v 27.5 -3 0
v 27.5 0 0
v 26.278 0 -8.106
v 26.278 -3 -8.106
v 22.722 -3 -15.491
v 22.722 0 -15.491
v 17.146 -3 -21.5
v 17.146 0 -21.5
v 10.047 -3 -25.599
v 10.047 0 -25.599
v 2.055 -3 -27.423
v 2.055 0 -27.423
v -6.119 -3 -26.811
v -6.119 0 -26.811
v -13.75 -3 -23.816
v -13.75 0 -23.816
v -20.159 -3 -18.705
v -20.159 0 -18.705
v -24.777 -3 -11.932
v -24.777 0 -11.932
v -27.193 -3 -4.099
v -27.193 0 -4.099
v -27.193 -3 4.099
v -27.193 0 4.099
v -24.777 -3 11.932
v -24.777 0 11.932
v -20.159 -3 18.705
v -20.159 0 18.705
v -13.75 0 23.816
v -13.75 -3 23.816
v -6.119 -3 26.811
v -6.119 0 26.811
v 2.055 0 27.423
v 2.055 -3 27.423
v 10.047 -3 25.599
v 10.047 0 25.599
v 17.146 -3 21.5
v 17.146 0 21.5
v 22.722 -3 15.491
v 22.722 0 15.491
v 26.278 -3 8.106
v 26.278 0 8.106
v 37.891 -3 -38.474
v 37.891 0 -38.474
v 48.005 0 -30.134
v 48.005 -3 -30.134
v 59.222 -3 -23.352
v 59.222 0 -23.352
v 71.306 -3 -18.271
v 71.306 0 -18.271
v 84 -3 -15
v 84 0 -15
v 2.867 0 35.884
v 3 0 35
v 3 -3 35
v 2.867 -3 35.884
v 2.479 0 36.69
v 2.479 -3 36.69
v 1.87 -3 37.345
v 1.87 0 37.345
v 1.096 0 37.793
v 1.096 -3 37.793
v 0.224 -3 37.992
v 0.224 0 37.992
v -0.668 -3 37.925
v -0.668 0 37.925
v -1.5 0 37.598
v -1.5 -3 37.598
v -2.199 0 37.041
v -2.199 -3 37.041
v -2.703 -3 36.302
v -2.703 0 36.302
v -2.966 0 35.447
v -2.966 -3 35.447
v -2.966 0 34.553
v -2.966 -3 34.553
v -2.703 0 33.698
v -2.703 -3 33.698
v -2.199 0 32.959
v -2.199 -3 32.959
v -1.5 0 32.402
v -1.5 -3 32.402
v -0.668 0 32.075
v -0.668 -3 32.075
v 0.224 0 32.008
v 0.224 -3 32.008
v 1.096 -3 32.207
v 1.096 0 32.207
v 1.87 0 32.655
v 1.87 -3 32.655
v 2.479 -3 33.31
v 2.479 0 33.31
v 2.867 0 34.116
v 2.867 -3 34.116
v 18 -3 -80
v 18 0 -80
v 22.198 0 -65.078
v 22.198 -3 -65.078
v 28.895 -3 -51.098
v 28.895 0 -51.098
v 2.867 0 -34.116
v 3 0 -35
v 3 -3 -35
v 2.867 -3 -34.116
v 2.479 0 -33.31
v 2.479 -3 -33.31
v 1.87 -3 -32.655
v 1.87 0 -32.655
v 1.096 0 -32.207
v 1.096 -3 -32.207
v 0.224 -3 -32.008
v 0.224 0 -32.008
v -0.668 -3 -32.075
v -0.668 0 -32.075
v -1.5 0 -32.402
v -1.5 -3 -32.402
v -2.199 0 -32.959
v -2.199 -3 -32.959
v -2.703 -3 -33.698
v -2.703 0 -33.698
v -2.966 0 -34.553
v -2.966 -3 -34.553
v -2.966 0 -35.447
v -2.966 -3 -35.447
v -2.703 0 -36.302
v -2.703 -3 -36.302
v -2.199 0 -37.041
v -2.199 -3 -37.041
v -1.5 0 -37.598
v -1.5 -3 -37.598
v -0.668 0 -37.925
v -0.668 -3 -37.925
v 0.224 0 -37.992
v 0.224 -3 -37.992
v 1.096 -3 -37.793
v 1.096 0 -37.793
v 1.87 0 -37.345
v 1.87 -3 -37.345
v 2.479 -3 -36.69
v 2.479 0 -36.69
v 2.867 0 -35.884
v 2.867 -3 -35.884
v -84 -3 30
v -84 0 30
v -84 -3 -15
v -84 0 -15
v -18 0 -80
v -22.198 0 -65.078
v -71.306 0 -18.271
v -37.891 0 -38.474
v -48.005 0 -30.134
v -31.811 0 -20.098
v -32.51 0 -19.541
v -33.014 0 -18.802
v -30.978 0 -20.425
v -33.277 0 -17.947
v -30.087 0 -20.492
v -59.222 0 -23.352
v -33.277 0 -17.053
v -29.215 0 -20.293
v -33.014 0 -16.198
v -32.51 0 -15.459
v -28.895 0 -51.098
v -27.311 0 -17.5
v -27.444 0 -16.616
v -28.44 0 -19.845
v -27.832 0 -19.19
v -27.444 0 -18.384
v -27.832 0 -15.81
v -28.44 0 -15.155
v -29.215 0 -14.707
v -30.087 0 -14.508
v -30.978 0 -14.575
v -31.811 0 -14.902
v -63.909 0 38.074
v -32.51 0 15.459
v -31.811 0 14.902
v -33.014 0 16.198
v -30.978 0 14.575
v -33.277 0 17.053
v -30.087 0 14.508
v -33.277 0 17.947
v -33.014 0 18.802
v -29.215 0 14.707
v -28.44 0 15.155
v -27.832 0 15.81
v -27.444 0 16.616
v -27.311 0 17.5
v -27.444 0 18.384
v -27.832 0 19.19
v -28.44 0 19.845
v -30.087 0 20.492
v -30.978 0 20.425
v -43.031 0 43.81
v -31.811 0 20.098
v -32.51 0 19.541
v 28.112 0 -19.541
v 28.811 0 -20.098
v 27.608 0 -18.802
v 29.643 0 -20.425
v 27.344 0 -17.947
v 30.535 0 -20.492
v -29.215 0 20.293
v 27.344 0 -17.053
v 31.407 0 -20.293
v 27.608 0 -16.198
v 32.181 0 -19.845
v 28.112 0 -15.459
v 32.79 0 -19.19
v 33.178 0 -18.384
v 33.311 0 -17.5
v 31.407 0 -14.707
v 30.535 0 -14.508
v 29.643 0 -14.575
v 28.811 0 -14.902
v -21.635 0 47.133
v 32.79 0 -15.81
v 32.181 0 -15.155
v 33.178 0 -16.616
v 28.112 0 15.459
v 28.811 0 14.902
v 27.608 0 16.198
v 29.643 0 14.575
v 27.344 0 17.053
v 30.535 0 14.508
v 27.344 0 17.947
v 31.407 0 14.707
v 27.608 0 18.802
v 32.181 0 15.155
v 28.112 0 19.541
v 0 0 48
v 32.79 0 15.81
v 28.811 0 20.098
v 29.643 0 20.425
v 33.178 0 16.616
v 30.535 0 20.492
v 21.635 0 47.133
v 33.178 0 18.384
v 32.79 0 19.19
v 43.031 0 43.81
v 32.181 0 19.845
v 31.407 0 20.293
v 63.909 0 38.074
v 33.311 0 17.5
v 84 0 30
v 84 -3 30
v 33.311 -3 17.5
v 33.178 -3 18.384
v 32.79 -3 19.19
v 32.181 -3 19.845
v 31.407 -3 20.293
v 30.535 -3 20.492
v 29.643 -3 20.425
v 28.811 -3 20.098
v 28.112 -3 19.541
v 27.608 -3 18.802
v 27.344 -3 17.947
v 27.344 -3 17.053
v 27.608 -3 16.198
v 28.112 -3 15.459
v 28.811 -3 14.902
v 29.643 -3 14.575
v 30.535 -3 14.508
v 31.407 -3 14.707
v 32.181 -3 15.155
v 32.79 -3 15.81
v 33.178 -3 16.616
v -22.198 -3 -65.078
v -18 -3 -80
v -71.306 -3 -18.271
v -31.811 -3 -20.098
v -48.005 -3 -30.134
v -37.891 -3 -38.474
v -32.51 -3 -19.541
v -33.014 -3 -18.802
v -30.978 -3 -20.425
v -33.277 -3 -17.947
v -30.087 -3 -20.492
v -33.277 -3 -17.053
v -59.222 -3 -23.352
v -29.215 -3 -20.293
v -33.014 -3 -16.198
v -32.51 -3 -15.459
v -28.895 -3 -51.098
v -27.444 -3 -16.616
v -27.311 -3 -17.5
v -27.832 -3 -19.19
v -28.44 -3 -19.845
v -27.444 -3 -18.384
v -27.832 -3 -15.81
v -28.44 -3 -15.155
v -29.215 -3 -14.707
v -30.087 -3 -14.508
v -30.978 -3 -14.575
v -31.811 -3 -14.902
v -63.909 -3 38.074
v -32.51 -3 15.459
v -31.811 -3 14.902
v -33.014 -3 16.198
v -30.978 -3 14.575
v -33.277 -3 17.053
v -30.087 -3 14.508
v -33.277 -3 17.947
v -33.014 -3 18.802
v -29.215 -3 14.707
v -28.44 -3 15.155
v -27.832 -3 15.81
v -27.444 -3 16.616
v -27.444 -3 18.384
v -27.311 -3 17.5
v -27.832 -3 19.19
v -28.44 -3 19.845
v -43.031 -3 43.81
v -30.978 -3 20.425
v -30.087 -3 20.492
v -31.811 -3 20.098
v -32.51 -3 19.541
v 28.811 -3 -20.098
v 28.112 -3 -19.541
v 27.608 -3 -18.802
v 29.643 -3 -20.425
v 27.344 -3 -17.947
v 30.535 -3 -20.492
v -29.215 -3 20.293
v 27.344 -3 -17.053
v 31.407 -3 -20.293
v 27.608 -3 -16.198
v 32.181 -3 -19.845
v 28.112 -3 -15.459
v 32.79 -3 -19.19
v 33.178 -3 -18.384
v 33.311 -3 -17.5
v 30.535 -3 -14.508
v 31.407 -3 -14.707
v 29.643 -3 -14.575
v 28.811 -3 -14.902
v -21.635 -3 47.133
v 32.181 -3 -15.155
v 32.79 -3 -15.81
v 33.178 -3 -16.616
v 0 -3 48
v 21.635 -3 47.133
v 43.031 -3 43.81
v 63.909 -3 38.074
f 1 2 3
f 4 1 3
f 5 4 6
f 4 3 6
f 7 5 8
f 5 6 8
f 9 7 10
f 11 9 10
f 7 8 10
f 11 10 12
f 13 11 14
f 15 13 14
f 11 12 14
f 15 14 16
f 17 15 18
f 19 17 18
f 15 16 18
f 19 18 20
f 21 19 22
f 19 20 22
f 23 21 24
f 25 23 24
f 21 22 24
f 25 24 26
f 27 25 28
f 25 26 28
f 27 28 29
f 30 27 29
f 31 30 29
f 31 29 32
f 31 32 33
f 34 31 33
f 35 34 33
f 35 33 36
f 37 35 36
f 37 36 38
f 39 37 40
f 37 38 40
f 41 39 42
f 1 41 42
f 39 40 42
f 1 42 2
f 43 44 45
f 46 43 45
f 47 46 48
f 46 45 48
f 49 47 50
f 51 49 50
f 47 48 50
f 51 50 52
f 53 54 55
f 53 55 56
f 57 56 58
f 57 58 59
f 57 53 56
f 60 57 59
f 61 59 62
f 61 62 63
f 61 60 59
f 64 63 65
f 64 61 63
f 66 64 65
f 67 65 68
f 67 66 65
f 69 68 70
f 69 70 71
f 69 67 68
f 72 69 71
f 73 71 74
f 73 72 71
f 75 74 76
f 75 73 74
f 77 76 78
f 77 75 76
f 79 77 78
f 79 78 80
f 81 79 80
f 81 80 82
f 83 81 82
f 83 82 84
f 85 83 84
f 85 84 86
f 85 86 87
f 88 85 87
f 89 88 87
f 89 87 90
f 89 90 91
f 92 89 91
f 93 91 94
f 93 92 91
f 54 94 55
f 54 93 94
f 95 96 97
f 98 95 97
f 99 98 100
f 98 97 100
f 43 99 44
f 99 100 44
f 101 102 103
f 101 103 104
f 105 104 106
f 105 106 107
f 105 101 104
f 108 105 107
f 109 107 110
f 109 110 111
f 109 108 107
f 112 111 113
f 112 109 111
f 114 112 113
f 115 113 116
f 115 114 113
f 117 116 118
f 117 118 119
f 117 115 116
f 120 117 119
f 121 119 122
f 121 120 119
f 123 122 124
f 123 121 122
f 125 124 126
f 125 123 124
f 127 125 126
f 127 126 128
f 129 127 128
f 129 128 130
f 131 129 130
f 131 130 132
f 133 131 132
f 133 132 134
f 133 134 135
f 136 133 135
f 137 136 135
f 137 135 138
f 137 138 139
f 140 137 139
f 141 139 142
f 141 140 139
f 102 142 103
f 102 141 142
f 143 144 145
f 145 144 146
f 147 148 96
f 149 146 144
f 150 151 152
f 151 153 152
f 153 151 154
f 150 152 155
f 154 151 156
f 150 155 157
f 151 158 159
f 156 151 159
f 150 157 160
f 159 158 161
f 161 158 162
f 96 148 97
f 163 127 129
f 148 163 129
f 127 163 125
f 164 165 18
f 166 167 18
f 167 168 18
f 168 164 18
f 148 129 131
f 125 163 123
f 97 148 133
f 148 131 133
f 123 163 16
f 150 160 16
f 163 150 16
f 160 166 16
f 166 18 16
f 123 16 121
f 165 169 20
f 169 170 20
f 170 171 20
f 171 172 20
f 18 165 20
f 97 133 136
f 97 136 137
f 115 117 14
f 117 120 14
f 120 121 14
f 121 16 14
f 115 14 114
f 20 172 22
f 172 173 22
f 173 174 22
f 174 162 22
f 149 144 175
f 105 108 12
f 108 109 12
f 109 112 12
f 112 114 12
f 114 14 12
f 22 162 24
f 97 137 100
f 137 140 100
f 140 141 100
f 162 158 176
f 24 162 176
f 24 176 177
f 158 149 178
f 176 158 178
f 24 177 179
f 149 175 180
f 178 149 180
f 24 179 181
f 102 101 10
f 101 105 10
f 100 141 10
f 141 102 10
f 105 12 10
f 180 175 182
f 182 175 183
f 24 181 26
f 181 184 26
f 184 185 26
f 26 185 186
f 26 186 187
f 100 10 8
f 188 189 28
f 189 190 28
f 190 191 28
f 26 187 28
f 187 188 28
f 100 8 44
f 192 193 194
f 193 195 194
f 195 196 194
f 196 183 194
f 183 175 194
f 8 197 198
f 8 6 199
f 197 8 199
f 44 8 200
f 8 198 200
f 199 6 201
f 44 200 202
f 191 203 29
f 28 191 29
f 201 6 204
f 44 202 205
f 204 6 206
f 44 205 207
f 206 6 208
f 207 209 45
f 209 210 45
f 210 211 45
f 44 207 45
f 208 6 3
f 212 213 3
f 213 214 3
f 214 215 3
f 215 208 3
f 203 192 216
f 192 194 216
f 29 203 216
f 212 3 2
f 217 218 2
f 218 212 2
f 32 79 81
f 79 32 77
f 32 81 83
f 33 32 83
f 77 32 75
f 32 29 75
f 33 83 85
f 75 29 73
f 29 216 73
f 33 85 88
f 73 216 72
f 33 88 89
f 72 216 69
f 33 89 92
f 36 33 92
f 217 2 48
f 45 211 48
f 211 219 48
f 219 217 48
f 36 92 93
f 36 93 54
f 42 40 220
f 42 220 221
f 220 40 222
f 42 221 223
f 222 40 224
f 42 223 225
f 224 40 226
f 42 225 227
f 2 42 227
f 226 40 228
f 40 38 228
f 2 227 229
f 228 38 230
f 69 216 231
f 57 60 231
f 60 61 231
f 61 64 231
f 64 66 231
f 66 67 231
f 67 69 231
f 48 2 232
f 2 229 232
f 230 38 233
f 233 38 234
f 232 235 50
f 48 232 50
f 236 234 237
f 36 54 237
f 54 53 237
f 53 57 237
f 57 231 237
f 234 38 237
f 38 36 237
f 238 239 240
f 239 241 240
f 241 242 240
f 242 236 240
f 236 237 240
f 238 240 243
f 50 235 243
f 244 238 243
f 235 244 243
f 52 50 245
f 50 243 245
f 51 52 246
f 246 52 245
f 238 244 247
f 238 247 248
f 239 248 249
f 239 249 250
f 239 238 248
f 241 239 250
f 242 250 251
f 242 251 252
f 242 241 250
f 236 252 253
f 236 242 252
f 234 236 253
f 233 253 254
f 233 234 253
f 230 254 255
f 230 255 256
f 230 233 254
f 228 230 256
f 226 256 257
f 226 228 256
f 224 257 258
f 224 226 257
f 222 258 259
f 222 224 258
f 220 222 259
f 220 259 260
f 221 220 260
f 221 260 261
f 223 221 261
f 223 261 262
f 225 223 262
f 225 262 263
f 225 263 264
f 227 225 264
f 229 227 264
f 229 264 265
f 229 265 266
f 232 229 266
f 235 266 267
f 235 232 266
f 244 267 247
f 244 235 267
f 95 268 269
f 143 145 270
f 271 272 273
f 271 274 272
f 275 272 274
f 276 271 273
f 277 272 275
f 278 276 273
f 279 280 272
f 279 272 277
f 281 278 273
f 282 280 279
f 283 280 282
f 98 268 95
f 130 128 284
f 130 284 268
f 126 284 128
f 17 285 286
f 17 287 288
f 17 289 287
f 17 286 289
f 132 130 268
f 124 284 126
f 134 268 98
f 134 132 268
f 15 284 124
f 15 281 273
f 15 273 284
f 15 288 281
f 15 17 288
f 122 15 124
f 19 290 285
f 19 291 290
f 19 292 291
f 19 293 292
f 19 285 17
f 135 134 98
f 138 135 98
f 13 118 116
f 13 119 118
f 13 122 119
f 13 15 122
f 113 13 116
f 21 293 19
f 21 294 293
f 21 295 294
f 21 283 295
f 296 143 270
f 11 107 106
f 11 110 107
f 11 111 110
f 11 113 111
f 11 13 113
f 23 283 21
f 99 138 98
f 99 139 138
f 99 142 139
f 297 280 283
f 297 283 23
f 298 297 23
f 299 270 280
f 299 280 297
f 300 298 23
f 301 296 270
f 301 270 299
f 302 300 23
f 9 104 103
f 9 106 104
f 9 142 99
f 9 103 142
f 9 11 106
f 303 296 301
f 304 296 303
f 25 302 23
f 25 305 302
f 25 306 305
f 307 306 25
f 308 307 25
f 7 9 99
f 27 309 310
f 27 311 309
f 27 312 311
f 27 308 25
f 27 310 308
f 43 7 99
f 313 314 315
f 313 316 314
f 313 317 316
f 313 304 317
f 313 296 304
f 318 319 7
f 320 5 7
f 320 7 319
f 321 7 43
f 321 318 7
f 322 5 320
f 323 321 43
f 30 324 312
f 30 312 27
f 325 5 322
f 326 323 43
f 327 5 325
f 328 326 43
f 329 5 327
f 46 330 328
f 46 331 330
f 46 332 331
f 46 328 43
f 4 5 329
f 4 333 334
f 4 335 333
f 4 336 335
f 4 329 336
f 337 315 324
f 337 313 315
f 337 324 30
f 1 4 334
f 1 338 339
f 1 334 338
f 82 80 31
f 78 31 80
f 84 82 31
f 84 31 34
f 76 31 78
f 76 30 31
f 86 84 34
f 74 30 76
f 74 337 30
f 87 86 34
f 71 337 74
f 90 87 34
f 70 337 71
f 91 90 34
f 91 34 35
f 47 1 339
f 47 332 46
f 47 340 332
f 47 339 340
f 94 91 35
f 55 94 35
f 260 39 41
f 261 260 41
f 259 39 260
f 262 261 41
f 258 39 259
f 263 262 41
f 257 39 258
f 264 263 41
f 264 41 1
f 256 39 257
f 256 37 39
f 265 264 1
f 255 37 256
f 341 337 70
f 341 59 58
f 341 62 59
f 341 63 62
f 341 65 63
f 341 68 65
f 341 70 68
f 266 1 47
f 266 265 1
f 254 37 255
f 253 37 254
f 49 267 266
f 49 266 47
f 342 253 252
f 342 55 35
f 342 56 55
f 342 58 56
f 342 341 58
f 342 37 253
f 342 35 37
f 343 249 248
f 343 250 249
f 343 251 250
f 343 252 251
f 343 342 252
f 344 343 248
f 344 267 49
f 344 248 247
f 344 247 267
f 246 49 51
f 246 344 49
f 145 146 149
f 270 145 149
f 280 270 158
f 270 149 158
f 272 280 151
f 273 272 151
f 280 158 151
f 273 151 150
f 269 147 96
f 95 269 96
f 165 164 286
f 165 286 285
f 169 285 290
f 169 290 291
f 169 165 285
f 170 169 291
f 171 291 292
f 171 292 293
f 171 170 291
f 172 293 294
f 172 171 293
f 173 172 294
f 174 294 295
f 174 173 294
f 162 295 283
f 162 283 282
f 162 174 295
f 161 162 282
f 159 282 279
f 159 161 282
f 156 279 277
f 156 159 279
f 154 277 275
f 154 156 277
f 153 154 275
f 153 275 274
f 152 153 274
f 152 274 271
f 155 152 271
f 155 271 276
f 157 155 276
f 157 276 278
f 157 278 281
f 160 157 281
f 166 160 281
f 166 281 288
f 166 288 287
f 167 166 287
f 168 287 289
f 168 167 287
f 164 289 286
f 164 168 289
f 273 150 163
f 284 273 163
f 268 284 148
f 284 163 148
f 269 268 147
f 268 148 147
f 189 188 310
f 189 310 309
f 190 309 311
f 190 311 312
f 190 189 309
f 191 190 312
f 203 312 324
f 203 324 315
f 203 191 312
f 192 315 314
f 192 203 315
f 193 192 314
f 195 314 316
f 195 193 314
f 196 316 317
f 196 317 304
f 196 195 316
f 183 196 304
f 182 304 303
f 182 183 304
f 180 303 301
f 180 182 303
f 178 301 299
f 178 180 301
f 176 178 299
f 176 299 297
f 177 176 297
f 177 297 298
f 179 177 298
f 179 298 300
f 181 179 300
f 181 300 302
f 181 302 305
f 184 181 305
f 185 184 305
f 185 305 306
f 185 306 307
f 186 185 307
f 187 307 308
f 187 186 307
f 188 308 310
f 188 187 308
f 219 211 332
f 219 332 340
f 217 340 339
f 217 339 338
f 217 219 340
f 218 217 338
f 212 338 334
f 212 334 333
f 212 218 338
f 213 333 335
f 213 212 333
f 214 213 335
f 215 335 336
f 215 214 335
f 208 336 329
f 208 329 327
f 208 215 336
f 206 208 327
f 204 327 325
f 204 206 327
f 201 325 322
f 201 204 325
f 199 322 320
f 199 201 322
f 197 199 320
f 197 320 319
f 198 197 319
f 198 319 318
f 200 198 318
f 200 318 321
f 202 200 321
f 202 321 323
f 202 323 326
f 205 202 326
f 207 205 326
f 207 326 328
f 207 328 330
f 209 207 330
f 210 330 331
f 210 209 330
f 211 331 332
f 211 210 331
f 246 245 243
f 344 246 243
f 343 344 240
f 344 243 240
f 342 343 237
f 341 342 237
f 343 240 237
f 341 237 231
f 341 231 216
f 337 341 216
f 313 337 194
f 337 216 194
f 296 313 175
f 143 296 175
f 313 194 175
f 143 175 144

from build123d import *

# Parameters (mm, degrees)
F0_R     = 3
F1_DEPTH = 3


# Not quite as in the source:
# - a feature names something its author has since deleted; it is built from what else it names


with BuildPart() as f1:
    # F0 (on Front) → F1 (new body)
    with BuildSketch(Plane.XZ):
        with BuildLine():
            ThreePointArc((18, -80), (25.2450835608, -57.9435000854), (37.8911830779, -38.474124356))
            ThreePointArc((37.8911830779, -38.474124356), (59.2223421632, -23.3521866114), (84, -15))
            Line((84, -15), (84, 30))
            ThreePointArc((84, 30), (43.0306603199, 43.8097481595), (0, 48))
            ThreePointArc((0, 48), (-43.0306603199, 43.8097481595), (-84, 30))
            Line((-84, 30), (-84, -15))
            ThreePointArc((-84, -15), (-59.2223421632, -23.3521866114), (-37.8911830779, -38.474124356))
            ThreePointArc((-37.8911830779, -38.474124356), (-25.2450835608, -57.9435000854), (-18, -80))
            Line((-18, -80), (0, -80))
            Line((0, -80), (18, -80))
        make_face()
        with Locations((-30.3108891325, -17.5)):
            Circle(F0_R, mode=Mode.SUBTRACT)
        with Locations((0, -35)):
            Circle(F0_R, mode=Mode.SUBTRACT)
        with Locations((30.3108891325, -17.5)):
            Circle(F0_R, mode=Mode.SUBTRACT)
        with Locations((-30.3108891325, 17.5)):
            Circle(F0_R, mode=Mode.SUBTRACT)
        with BuildLine():
            ThreePointArc((19.2964358267, -19.5933040702), (-25.3663358138, 10.6206877076), (27.5, 0))
            ThreePointArc((27.5, 0), (25.3663358138, -10.6206877076), (19.2964358267, -19.5933040702))
        make_face(mode=Mode.SUBTRACT)
        with Locations((30.3108891325, 17.5)):
            Circle(F0_R, mode=Mode.SUBTRACT)
        with Locations((0, 35)):
            Circle(F0_R, mode=Mode.SUBTRACT)
    extrude(amount=F1_DEPTH)


solid = f1.part
